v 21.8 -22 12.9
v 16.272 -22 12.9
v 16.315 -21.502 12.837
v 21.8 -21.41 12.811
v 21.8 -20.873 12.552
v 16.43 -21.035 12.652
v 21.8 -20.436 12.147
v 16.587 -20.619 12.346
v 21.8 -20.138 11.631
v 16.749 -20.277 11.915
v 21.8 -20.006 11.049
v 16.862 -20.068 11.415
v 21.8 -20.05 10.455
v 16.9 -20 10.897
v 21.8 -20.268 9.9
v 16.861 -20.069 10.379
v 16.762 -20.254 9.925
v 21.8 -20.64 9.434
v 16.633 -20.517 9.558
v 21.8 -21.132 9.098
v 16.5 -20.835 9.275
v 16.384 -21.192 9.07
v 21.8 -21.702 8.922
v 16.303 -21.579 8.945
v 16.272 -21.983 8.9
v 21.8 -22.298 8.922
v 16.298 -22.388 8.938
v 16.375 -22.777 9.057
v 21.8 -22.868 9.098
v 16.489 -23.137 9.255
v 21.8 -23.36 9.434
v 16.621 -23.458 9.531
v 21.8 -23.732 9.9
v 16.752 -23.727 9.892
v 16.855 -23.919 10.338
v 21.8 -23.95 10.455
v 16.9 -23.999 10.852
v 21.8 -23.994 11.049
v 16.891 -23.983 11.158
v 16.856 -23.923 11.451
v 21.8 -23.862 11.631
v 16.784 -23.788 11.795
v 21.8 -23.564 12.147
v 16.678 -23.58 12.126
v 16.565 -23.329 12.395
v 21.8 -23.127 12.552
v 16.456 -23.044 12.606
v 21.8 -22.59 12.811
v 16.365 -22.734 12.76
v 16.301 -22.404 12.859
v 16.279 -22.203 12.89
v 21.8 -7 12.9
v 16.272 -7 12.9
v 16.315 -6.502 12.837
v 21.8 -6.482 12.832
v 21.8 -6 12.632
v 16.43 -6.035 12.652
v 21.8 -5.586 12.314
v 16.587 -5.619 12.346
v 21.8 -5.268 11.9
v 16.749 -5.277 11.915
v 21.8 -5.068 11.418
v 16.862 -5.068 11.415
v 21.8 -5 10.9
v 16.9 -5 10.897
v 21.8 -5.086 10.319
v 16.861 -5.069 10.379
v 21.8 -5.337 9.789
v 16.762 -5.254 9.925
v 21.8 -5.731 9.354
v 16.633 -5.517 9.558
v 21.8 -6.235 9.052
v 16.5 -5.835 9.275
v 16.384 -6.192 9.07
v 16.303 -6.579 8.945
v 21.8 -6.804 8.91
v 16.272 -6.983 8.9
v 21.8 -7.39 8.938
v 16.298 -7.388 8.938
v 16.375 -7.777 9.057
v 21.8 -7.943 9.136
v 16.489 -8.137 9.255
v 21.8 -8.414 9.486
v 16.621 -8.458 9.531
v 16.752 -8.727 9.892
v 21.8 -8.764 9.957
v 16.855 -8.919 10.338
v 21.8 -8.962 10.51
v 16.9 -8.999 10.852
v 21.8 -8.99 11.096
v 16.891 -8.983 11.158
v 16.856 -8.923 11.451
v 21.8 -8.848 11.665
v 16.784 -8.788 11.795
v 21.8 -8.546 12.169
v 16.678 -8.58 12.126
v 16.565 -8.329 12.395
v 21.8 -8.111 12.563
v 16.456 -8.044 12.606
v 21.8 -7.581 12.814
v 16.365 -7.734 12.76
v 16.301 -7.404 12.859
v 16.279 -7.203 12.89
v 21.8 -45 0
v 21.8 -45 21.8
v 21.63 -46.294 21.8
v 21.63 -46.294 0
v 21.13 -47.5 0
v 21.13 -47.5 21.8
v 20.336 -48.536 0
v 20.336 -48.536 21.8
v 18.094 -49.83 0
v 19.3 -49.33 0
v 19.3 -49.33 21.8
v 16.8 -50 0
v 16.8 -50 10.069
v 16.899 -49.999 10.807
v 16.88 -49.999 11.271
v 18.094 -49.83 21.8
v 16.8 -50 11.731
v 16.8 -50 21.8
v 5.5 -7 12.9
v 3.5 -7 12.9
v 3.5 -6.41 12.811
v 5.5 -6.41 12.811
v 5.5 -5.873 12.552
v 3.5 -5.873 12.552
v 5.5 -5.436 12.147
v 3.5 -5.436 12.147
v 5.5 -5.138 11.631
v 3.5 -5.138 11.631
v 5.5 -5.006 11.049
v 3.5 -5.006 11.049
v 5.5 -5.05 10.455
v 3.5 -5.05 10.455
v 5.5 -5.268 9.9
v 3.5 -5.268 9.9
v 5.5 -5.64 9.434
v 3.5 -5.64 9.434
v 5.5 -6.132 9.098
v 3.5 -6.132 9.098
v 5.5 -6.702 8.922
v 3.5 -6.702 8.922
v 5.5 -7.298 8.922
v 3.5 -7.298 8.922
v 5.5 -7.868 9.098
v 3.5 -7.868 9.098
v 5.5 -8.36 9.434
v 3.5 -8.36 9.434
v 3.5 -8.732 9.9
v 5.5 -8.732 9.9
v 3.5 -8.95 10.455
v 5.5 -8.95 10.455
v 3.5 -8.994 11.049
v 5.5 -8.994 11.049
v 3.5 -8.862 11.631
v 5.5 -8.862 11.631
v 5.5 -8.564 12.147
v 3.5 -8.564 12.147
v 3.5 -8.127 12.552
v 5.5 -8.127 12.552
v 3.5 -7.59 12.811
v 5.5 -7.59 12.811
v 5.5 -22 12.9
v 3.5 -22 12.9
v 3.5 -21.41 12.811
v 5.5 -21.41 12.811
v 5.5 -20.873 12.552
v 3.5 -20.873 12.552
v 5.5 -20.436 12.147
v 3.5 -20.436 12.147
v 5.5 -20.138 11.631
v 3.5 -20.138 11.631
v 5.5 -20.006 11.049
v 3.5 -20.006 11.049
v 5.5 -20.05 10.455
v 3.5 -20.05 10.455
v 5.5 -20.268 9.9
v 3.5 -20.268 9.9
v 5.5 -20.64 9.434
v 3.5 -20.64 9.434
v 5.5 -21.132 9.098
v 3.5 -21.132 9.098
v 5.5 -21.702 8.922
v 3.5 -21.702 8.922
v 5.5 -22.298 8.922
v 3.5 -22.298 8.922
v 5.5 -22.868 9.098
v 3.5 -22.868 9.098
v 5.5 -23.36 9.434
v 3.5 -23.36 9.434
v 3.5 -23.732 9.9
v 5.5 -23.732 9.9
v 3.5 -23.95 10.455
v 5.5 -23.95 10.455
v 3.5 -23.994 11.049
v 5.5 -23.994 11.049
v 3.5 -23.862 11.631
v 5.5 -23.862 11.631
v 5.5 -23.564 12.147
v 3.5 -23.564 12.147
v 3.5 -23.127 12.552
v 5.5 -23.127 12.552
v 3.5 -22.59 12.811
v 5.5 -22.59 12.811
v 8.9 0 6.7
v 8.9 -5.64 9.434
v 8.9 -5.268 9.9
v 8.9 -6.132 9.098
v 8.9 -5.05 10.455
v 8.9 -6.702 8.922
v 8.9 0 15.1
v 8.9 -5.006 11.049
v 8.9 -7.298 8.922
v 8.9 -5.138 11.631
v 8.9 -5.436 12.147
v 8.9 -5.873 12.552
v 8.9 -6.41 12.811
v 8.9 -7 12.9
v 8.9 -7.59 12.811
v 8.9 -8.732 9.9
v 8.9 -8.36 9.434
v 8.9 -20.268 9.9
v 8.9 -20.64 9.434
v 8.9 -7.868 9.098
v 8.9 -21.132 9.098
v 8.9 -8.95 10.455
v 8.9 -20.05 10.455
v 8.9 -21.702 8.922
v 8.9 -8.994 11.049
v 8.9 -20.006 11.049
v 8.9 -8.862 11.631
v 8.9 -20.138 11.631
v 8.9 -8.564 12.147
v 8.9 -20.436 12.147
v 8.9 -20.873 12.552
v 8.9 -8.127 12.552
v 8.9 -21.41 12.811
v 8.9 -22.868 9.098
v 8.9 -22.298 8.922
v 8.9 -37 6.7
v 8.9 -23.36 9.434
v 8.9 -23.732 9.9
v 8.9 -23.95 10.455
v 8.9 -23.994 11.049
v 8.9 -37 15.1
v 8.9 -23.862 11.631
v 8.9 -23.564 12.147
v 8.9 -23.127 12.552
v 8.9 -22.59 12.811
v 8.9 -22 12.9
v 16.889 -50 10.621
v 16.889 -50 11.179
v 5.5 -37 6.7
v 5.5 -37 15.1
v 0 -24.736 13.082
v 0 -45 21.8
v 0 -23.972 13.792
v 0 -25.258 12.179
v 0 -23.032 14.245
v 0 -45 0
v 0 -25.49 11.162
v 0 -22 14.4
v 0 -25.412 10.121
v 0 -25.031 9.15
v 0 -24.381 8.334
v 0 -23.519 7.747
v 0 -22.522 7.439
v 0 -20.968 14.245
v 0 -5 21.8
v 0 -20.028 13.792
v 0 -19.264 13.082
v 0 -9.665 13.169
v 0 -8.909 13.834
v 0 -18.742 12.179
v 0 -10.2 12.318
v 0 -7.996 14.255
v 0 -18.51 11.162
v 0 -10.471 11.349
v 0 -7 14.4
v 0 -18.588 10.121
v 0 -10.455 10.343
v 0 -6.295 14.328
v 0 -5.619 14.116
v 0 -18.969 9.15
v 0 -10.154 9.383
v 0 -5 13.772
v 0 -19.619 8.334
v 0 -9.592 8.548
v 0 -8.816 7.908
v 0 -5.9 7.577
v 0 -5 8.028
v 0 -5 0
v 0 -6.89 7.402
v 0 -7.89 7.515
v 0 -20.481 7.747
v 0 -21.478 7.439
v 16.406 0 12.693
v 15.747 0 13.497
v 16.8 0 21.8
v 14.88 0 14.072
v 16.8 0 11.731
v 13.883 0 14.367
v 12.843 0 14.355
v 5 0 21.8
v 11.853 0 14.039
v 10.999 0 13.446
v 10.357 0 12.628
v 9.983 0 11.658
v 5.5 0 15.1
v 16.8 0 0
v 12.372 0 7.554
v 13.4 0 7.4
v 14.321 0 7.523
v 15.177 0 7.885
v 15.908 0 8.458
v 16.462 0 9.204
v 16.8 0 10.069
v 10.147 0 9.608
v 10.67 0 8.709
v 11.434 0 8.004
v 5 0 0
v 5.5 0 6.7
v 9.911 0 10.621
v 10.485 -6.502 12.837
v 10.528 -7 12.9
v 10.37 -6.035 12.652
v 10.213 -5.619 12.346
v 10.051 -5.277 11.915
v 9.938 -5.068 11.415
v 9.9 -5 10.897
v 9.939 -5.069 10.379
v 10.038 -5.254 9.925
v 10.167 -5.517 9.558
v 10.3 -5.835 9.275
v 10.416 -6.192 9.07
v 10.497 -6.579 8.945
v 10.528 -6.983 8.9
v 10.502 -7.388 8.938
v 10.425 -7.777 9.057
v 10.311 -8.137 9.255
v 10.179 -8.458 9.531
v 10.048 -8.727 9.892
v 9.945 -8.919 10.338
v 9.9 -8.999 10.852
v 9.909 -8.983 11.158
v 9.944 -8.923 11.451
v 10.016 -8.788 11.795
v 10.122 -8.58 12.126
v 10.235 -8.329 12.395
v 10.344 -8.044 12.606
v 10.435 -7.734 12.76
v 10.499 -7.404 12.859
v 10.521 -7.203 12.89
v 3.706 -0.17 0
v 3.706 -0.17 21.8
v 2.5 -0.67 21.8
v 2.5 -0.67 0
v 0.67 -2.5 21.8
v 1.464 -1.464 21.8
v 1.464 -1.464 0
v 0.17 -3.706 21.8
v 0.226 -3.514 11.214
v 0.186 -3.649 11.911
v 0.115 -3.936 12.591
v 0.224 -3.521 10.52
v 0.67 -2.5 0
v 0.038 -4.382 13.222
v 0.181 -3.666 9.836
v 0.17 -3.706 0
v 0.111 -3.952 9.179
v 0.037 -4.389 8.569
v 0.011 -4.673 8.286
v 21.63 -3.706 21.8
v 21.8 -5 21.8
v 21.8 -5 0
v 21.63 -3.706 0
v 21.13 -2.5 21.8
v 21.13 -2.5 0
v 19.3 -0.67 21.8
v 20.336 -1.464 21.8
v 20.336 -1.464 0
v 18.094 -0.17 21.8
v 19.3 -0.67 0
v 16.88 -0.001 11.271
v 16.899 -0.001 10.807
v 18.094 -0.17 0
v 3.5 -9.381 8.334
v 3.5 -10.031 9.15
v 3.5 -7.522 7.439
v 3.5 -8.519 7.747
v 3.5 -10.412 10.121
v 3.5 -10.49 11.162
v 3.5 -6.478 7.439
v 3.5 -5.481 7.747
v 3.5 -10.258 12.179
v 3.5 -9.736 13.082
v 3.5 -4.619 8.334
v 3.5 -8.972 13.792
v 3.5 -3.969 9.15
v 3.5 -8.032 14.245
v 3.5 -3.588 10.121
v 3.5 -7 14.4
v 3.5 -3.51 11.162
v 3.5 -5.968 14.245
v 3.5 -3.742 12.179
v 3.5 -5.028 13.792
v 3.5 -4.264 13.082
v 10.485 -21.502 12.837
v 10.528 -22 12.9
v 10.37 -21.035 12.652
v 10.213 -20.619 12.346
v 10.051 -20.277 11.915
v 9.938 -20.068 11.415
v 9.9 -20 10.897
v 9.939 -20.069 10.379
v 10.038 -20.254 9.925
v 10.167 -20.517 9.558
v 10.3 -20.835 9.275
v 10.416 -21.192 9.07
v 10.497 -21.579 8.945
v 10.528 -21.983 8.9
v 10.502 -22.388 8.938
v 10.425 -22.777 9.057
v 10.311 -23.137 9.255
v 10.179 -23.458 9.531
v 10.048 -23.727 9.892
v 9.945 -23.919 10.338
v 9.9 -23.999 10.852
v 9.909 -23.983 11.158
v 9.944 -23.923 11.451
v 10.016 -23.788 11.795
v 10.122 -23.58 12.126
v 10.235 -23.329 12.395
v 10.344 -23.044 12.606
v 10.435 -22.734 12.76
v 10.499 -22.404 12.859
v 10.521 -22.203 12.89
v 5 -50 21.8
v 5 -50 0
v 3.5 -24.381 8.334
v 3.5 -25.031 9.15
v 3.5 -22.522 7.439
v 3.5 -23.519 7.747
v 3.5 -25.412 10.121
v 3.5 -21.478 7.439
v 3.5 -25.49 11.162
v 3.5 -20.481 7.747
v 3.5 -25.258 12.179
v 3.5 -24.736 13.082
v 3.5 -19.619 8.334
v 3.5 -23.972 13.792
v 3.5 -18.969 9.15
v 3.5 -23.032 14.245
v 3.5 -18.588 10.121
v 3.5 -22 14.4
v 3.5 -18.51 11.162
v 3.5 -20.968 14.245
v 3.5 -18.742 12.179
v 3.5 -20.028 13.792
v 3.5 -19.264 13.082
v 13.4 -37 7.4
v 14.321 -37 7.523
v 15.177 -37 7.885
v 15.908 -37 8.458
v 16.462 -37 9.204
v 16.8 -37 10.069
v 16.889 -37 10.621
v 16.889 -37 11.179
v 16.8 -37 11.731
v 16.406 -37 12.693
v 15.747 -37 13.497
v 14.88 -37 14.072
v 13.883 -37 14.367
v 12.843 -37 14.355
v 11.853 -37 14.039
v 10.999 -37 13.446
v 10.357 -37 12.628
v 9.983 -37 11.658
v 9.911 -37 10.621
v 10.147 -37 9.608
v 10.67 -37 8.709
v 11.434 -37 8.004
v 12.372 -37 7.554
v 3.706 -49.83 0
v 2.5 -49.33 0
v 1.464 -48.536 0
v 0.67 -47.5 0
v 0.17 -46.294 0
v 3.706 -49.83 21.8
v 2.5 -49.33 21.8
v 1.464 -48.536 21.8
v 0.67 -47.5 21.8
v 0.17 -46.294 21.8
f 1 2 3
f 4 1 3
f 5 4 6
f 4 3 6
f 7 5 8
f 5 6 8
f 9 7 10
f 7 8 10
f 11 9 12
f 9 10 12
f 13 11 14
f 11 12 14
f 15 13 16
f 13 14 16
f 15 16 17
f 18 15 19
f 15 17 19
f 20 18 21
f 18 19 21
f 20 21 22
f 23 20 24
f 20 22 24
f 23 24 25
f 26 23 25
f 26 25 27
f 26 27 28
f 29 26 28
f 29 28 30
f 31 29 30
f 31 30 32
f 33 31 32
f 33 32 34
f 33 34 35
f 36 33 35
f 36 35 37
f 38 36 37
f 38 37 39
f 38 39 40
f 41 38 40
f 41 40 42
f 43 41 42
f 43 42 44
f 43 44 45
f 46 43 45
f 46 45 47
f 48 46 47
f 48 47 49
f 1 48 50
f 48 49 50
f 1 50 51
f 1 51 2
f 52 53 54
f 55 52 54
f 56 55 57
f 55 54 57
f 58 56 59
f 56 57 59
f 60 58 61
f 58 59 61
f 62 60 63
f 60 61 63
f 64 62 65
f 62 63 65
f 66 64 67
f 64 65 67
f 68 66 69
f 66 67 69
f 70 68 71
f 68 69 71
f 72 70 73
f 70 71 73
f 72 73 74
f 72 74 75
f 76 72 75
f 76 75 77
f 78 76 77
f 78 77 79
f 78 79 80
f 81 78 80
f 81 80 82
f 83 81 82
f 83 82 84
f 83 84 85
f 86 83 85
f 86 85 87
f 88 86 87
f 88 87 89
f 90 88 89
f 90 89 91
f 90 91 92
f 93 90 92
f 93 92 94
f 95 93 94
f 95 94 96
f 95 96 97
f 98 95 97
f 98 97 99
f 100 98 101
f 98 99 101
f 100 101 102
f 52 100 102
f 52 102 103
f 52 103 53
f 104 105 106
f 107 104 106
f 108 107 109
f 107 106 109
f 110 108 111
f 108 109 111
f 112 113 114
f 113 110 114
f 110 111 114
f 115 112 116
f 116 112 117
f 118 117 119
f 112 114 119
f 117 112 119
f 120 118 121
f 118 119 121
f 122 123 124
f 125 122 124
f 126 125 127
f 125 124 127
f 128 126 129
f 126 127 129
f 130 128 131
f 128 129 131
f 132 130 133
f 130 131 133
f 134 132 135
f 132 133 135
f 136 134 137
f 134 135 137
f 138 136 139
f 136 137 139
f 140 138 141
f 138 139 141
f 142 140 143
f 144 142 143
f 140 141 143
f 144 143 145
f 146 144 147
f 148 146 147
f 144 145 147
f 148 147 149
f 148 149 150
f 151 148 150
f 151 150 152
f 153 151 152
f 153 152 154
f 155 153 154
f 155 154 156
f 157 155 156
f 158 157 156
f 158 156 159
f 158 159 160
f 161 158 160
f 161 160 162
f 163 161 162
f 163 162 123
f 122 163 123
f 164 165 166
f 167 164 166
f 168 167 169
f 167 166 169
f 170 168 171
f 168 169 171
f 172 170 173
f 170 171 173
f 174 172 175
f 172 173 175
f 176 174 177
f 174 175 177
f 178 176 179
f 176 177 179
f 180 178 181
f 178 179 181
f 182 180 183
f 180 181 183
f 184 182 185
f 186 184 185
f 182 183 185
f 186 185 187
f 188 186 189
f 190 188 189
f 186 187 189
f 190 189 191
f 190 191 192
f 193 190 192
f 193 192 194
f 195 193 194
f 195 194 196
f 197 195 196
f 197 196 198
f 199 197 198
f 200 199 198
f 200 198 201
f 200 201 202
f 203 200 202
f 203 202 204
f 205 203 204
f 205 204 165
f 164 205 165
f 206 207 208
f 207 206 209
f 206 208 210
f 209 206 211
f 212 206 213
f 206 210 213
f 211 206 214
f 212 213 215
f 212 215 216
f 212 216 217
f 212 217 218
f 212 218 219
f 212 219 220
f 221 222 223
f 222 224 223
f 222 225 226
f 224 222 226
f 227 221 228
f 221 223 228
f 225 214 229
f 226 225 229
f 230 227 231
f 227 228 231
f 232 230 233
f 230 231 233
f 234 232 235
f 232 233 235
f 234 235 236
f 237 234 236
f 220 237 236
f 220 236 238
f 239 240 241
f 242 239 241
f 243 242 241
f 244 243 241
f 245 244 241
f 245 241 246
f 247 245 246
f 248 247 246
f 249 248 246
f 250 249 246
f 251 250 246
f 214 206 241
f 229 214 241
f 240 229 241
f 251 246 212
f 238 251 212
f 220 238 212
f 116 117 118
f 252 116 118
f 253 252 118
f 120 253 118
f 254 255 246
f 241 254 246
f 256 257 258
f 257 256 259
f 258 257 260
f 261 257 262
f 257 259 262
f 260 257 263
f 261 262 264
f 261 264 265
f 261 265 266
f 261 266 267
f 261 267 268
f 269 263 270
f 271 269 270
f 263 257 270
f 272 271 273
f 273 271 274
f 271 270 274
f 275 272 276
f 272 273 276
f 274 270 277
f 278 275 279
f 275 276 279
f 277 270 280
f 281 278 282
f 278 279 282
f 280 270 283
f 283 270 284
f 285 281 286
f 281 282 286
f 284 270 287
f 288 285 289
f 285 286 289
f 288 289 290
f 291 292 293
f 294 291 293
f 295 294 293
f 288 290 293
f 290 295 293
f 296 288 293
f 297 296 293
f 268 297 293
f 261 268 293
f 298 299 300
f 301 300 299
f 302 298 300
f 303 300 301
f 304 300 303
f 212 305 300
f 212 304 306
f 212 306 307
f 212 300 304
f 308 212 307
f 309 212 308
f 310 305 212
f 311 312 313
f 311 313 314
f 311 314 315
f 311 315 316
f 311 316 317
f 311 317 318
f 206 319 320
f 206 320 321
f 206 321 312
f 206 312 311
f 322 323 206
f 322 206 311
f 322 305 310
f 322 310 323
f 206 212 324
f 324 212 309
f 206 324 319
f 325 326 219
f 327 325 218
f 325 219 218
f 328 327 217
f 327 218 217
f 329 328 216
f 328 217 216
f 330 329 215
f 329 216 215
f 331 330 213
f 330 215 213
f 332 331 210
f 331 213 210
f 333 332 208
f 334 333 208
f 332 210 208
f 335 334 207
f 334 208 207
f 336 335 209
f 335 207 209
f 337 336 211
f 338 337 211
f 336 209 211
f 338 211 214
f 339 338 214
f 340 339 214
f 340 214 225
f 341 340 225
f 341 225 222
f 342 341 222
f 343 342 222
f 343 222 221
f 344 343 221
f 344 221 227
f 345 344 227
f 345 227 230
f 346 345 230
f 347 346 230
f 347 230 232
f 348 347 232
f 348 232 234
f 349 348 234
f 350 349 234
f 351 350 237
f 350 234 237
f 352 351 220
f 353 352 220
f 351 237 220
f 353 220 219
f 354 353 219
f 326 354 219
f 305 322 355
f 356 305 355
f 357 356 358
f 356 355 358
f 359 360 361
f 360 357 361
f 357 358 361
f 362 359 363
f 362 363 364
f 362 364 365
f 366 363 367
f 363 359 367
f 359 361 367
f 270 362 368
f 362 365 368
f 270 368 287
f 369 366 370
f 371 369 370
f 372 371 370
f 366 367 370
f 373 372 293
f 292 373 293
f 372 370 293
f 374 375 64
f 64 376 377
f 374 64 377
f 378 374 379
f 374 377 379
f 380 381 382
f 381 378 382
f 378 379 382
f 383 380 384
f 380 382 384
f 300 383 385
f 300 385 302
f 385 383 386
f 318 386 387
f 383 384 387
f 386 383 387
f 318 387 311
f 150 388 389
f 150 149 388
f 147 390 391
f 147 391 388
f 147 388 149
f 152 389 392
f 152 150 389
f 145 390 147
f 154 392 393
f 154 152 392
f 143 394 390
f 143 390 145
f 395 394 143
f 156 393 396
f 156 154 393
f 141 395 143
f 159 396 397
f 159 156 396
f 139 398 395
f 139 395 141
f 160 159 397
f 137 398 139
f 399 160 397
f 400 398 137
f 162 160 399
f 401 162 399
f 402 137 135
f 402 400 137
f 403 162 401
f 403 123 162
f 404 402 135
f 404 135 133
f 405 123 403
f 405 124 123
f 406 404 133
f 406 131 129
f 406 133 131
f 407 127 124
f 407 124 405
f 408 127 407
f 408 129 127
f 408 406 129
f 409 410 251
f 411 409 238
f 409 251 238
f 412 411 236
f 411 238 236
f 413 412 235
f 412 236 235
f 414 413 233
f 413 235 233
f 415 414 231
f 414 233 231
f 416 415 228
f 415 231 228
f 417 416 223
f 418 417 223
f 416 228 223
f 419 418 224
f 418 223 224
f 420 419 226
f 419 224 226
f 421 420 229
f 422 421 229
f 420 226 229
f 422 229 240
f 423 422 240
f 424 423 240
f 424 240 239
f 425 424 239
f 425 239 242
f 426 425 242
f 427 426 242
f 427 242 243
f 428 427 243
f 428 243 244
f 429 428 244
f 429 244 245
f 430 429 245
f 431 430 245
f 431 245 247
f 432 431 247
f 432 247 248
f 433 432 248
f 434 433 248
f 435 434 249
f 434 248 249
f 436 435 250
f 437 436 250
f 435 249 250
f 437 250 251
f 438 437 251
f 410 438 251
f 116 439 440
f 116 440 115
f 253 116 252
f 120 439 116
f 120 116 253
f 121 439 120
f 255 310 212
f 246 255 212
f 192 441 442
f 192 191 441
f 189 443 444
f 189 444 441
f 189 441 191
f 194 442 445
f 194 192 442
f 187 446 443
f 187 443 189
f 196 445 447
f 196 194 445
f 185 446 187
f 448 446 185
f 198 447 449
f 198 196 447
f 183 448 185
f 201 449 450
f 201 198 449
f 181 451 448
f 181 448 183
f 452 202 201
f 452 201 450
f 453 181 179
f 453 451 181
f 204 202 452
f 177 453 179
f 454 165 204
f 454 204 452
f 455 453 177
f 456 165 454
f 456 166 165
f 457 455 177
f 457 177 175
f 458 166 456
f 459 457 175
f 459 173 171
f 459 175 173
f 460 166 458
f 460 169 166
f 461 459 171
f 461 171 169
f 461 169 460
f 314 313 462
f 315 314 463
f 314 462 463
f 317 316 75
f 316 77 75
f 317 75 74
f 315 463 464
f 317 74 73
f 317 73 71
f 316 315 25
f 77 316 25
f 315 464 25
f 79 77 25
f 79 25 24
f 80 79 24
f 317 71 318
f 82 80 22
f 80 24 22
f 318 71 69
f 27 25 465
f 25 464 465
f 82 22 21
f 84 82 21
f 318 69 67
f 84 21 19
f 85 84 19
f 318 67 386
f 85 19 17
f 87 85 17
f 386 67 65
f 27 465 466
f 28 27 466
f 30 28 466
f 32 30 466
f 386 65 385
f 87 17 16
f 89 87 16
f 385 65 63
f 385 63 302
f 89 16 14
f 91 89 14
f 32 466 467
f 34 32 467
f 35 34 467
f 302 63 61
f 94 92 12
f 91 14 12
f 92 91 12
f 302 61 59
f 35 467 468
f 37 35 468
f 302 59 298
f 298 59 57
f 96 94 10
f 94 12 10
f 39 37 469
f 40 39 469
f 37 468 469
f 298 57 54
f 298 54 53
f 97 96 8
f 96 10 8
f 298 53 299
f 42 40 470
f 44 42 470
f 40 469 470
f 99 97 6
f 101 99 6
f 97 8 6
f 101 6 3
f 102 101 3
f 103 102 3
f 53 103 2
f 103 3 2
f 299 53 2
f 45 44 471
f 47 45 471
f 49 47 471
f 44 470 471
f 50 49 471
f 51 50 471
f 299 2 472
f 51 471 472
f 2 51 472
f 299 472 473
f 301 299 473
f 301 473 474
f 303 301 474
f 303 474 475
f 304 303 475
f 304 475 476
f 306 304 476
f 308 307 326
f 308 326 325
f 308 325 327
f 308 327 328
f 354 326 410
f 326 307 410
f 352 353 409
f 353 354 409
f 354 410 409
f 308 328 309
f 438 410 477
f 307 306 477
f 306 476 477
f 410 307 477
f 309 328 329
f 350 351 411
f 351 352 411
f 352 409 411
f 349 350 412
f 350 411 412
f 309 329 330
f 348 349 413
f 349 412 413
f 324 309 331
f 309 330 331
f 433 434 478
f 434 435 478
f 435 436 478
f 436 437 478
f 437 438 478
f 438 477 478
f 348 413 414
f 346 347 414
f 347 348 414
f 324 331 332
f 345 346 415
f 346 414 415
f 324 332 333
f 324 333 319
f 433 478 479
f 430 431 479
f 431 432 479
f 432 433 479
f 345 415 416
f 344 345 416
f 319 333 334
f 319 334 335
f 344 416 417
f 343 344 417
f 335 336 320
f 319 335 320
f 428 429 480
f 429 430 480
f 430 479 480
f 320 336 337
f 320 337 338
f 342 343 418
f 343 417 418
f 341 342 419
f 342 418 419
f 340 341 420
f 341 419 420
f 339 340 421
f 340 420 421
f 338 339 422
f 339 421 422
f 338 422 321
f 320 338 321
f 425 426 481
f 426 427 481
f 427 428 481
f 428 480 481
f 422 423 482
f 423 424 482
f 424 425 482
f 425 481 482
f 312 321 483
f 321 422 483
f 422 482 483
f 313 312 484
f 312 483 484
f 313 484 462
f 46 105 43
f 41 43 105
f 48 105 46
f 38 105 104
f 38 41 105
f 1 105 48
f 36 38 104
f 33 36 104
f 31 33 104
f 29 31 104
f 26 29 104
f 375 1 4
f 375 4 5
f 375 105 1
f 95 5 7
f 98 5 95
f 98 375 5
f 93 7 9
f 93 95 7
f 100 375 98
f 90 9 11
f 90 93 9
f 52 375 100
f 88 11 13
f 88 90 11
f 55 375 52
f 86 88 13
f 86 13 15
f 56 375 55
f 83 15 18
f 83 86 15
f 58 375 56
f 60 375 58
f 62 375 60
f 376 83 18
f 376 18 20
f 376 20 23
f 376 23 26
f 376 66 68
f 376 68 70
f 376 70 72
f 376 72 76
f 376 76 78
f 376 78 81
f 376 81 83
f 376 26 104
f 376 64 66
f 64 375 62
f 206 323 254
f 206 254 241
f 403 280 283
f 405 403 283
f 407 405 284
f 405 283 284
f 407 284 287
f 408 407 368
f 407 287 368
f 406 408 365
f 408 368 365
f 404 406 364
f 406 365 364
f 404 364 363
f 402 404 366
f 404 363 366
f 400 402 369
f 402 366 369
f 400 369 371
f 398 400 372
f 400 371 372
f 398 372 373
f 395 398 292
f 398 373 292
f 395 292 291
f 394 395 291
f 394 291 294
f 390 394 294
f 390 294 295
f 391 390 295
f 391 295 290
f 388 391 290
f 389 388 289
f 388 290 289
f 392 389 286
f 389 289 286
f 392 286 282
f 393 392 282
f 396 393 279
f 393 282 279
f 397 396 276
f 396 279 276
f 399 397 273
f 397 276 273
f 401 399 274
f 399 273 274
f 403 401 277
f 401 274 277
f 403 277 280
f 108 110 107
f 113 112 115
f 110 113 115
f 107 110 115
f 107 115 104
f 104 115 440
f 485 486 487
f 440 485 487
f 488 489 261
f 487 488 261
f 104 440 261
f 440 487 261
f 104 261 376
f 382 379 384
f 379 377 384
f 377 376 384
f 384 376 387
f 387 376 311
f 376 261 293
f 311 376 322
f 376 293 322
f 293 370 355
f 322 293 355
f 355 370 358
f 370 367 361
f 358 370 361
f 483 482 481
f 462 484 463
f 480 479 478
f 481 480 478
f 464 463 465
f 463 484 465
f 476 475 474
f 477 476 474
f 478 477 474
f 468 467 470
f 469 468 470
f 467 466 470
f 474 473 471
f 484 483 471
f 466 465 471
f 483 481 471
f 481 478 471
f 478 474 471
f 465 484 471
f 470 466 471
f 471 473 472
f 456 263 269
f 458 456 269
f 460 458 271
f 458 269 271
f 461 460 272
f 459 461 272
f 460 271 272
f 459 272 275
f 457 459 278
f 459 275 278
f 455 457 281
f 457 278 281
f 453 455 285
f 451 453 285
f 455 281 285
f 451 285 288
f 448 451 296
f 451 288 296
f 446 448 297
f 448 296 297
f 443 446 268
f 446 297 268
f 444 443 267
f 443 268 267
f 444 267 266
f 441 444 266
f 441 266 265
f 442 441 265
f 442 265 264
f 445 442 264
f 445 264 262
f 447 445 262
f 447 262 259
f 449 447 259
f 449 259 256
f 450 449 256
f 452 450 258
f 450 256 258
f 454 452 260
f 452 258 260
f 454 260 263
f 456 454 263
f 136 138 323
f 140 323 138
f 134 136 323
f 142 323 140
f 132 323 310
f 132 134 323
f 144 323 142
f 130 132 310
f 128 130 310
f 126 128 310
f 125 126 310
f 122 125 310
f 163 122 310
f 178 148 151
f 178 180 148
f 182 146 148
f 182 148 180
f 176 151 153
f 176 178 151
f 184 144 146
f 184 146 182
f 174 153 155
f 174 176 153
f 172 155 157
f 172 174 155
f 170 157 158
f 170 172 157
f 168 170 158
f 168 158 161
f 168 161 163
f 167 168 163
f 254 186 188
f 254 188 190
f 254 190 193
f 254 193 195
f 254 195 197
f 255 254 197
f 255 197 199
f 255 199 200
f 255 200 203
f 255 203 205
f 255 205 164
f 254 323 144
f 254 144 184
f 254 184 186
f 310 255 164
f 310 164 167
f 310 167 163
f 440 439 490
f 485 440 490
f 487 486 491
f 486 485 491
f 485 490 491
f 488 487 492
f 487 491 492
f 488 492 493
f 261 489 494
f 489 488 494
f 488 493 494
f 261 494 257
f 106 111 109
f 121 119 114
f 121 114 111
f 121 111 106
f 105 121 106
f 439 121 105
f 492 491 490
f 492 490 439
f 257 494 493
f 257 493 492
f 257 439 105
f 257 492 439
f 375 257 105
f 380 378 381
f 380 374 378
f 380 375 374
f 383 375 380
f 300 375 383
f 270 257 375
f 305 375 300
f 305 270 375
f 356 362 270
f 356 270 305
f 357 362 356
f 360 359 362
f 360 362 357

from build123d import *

# Parameters (mm, degrees)
CROQUIS1_W              = 21.8
CROQUIS1_H              = 50
SALIENTE_EXTRUIR1_DEPTH = 21.8
CROQUIS6_R              = 2
CORTAR_EXTRUIR2_DEPTH   = 21.8
CORTAR_EXTRUIR4_REACH   = 60.741
CROQUIS11_R             = 3.5
CROQUIS11_W             = 3.4
CROQUIS11_H             = 8.4
REDONDEO1_R             = 5
CROQUIS13_R             = 3.5
CORTAR_EXTRUIR6_DEPTH   = 3.5
CROQUIS15_W             = 3.4
CROQUIS15_H             = 8.4
SALIENTE_EXTRUIR2_DEPTH = 13


with BuildPart() as part:
    # Croquis1 → Saliente-Extruir1 (new body)
    with BuildSketch(Plane(origin=(0, 0, 0), x_dir=(0, 0, -1), z_dir=(1, 0, 0))):
        with Locations((-10.9, -25)):
            Rectangle(CROQUIS1_W, CROQUIS1_H)
    extrude(amount=SALIENTE_EXTRUIR1_DEPTH)

    # Croquis6 → Cortar-Extruir2 (cut)
    with BuildSketch(Plane.ZY):
        with Locations((10.9, -22)):
            Circle(CROQUIS6_R)
        with Locations((10.9, -7)):
            Circle(CROQUIS6_R)
    extrude(amount=-CORTAR_EXTRUIR2_DEPTH, mode=Mode.SUBTRACT)

    # Croquis11 → Cortar-Extruir4 (cut, up to next)
    with BuildSketch(Plane.XZ.offset(50), mode=Mode.PRIVATE) as cortar_extruir4_sk1:
        with Locations(Location((13.4, 10.9, 0), (0, 0, 270))):
            Circle(CROQUIS11_R)
    cortar_extruir4_tool1 = extrude(cortar_extruir4_sk1.sketch, amount=-CORTAR_EXTRUIR4_REACH, mode=Mode.PRIVATE) & part.part
    # Croquis11 → Cortar-Extruir4 (cut, up to next)
    with BuildSketch(Plane.XZ.offset(50), mode=Mode.PRIVATE) as cortar_extruir4_sk2:
        with Locations((7.2, 10.9)):
            Rectangle(CROQUIS11_W, CROQUIS11_H)
    cortar_extruir4_tool2 = extrude(cortar_extruir4_sk2.sketch, amount=-CORTAR_EXTRUIR4_REACH, mode=Mode.PRIVATE) & part.part
    add(cortar_extruir4_tool1.solids().sort_by_distance((13.4, -50, 10.9))[0], mode=Mode.SUBTRACT)
    add(cortar_extruir4_tool2.solids().sort_by_distance((7.2, -50, 10.9))[0], mode=Mode.SUBTRACT)

    # Redondeo1
    # the kernel refuses this fillet: 5 mm, written as the material it takes off along each edge
    with BuildSketch(Plane(origin=(21.8, -50, 34.3), x_dir=(0, 1, 0), z_dir=(0, 0, -1)), Plane(origin=(0, 0, -12.5), x_dir=(1, 0, 0), z_dir=(0, 0, 1))) as redondeo1_piece_1:
        with BuildLine():
            CenterArc((REDONDEO1_R, -REDONDEO1_R), REDONDEO1_R, 90, 90)
            Line((0, -REDONDEO1_R), (0, 0))
            Line((0, 0), (REDONDEO1_R, 0))
        make_face()
    extrude(amount=46.8, mode=Mode.SUBTRACT)
    with BuildSketch(Plane(origin=(21.8, 0, -12.5), x_dir=(-1, 0, 0), z_dir=(0, 0, 1)), Plane(origin=(0, -50, 34.3), x_dir=(0, 1, 0), z_dir=(0, 0, -1))) as redondeo1_piece_2:
        with BuildLine():
            CenterArc((REDONDEO1_R, REDONDEO1_R), REDONDEO1_R, 180, 90)
            Line((0, REDONDEO1_R), (0, 0))
            Line((0, 0), (REDONDEO1_R, 0))
        make_face()
    extrude(amount=46.8, mode=Mode.SUBTRACT)

    # Croquis13 → Cortar-Extruir6 (cut)
    with BuildSketch(Plane.ZY):
        with Locations((10.9, -7)):
            Circle(CROQUIS13_R)
        with Locations((10.9, -22)):
            Circle(CROQUIS13_R)
    extrude(amount=-CORTAR_EXTRUIR6_DEPTH, mode=Mode.SUBTRACT)

    # Croquis15 → Saliente-Extruir2 (add)
    with BuildSketch(Plane.XZ.offset(50)):
        with Locations((7.2, 10.9)):
            Rectangle(CROQUIS15_W, CROQUIS15_H)
        with BuildLine():
            ThreePointArc((16.8, 10.069337614), (16.9, 10.9), (16.8, 11.730662386))
            ThreePointArc((16.8, 11.730662386), (9.9, 10.9), (16.8, 10.069337614))
        make_face()
    extrude(amount=-SALIENTE_EXTRUIR2_DEPTH)


solid = part.part
